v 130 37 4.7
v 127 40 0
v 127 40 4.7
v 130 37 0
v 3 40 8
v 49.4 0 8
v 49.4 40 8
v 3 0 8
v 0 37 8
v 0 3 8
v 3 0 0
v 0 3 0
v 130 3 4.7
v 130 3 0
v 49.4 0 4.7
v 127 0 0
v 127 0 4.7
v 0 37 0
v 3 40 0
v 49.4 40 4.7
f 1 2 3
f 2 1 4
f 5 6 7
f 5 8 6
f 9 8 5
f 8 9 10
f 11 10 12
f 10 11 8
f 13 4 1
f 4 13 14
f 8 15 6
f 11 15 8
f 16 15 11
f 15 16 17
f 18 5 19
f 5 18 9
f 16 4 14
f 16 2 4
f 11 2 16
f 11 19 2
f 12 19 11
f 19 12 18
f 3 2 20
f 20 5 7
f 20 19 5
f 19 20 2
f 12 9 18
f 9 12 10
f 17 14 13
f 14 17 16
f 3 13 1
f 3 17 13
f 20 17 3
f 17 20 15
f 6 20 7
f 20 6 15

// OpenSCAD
$fn = 32;

// ----------------------------------------------------------------------
// Stepped bar: endstep, 130 x 40 x 8/4.7 mm
// ----------------------------------------------------------------------

// --- parameters (mm) ---
bar_l = 130;              // bar length, X
bar_w = 40;               // bar width, Y
plate_t = 8;              // thickness of the thick zone, Z
thin_t = 4.7;             // thickness of the thin zone
corner_c = 3;             // corner chamfer of the bar
step_cut = 3.3;           // material removed from the thin zone
step_x = 49.4;            // step position from the left end
depth_1 = 3.3;            // depth of cut 1 from the top face

profile = [[3, 0], [127, 0], [130, 3], [130, 37], [127, 40], [3, 40], [0, 37], [0, 3]];  // primary outline, 8 points, counter clockwise
void_1 = [[49.4, -1], [131, -1], [131, 41], [49.4, 41]];  // thin zone beyond the step, 4 points

// --- the one profile operation ---
difference() {
  linear_extrude(height = plate_t) polygon(points = profile);
  translate([0, 0, plate_t - depth_1])
    linear_extrude(height = depth_1 + 1) polygon(points = void_1);
}
